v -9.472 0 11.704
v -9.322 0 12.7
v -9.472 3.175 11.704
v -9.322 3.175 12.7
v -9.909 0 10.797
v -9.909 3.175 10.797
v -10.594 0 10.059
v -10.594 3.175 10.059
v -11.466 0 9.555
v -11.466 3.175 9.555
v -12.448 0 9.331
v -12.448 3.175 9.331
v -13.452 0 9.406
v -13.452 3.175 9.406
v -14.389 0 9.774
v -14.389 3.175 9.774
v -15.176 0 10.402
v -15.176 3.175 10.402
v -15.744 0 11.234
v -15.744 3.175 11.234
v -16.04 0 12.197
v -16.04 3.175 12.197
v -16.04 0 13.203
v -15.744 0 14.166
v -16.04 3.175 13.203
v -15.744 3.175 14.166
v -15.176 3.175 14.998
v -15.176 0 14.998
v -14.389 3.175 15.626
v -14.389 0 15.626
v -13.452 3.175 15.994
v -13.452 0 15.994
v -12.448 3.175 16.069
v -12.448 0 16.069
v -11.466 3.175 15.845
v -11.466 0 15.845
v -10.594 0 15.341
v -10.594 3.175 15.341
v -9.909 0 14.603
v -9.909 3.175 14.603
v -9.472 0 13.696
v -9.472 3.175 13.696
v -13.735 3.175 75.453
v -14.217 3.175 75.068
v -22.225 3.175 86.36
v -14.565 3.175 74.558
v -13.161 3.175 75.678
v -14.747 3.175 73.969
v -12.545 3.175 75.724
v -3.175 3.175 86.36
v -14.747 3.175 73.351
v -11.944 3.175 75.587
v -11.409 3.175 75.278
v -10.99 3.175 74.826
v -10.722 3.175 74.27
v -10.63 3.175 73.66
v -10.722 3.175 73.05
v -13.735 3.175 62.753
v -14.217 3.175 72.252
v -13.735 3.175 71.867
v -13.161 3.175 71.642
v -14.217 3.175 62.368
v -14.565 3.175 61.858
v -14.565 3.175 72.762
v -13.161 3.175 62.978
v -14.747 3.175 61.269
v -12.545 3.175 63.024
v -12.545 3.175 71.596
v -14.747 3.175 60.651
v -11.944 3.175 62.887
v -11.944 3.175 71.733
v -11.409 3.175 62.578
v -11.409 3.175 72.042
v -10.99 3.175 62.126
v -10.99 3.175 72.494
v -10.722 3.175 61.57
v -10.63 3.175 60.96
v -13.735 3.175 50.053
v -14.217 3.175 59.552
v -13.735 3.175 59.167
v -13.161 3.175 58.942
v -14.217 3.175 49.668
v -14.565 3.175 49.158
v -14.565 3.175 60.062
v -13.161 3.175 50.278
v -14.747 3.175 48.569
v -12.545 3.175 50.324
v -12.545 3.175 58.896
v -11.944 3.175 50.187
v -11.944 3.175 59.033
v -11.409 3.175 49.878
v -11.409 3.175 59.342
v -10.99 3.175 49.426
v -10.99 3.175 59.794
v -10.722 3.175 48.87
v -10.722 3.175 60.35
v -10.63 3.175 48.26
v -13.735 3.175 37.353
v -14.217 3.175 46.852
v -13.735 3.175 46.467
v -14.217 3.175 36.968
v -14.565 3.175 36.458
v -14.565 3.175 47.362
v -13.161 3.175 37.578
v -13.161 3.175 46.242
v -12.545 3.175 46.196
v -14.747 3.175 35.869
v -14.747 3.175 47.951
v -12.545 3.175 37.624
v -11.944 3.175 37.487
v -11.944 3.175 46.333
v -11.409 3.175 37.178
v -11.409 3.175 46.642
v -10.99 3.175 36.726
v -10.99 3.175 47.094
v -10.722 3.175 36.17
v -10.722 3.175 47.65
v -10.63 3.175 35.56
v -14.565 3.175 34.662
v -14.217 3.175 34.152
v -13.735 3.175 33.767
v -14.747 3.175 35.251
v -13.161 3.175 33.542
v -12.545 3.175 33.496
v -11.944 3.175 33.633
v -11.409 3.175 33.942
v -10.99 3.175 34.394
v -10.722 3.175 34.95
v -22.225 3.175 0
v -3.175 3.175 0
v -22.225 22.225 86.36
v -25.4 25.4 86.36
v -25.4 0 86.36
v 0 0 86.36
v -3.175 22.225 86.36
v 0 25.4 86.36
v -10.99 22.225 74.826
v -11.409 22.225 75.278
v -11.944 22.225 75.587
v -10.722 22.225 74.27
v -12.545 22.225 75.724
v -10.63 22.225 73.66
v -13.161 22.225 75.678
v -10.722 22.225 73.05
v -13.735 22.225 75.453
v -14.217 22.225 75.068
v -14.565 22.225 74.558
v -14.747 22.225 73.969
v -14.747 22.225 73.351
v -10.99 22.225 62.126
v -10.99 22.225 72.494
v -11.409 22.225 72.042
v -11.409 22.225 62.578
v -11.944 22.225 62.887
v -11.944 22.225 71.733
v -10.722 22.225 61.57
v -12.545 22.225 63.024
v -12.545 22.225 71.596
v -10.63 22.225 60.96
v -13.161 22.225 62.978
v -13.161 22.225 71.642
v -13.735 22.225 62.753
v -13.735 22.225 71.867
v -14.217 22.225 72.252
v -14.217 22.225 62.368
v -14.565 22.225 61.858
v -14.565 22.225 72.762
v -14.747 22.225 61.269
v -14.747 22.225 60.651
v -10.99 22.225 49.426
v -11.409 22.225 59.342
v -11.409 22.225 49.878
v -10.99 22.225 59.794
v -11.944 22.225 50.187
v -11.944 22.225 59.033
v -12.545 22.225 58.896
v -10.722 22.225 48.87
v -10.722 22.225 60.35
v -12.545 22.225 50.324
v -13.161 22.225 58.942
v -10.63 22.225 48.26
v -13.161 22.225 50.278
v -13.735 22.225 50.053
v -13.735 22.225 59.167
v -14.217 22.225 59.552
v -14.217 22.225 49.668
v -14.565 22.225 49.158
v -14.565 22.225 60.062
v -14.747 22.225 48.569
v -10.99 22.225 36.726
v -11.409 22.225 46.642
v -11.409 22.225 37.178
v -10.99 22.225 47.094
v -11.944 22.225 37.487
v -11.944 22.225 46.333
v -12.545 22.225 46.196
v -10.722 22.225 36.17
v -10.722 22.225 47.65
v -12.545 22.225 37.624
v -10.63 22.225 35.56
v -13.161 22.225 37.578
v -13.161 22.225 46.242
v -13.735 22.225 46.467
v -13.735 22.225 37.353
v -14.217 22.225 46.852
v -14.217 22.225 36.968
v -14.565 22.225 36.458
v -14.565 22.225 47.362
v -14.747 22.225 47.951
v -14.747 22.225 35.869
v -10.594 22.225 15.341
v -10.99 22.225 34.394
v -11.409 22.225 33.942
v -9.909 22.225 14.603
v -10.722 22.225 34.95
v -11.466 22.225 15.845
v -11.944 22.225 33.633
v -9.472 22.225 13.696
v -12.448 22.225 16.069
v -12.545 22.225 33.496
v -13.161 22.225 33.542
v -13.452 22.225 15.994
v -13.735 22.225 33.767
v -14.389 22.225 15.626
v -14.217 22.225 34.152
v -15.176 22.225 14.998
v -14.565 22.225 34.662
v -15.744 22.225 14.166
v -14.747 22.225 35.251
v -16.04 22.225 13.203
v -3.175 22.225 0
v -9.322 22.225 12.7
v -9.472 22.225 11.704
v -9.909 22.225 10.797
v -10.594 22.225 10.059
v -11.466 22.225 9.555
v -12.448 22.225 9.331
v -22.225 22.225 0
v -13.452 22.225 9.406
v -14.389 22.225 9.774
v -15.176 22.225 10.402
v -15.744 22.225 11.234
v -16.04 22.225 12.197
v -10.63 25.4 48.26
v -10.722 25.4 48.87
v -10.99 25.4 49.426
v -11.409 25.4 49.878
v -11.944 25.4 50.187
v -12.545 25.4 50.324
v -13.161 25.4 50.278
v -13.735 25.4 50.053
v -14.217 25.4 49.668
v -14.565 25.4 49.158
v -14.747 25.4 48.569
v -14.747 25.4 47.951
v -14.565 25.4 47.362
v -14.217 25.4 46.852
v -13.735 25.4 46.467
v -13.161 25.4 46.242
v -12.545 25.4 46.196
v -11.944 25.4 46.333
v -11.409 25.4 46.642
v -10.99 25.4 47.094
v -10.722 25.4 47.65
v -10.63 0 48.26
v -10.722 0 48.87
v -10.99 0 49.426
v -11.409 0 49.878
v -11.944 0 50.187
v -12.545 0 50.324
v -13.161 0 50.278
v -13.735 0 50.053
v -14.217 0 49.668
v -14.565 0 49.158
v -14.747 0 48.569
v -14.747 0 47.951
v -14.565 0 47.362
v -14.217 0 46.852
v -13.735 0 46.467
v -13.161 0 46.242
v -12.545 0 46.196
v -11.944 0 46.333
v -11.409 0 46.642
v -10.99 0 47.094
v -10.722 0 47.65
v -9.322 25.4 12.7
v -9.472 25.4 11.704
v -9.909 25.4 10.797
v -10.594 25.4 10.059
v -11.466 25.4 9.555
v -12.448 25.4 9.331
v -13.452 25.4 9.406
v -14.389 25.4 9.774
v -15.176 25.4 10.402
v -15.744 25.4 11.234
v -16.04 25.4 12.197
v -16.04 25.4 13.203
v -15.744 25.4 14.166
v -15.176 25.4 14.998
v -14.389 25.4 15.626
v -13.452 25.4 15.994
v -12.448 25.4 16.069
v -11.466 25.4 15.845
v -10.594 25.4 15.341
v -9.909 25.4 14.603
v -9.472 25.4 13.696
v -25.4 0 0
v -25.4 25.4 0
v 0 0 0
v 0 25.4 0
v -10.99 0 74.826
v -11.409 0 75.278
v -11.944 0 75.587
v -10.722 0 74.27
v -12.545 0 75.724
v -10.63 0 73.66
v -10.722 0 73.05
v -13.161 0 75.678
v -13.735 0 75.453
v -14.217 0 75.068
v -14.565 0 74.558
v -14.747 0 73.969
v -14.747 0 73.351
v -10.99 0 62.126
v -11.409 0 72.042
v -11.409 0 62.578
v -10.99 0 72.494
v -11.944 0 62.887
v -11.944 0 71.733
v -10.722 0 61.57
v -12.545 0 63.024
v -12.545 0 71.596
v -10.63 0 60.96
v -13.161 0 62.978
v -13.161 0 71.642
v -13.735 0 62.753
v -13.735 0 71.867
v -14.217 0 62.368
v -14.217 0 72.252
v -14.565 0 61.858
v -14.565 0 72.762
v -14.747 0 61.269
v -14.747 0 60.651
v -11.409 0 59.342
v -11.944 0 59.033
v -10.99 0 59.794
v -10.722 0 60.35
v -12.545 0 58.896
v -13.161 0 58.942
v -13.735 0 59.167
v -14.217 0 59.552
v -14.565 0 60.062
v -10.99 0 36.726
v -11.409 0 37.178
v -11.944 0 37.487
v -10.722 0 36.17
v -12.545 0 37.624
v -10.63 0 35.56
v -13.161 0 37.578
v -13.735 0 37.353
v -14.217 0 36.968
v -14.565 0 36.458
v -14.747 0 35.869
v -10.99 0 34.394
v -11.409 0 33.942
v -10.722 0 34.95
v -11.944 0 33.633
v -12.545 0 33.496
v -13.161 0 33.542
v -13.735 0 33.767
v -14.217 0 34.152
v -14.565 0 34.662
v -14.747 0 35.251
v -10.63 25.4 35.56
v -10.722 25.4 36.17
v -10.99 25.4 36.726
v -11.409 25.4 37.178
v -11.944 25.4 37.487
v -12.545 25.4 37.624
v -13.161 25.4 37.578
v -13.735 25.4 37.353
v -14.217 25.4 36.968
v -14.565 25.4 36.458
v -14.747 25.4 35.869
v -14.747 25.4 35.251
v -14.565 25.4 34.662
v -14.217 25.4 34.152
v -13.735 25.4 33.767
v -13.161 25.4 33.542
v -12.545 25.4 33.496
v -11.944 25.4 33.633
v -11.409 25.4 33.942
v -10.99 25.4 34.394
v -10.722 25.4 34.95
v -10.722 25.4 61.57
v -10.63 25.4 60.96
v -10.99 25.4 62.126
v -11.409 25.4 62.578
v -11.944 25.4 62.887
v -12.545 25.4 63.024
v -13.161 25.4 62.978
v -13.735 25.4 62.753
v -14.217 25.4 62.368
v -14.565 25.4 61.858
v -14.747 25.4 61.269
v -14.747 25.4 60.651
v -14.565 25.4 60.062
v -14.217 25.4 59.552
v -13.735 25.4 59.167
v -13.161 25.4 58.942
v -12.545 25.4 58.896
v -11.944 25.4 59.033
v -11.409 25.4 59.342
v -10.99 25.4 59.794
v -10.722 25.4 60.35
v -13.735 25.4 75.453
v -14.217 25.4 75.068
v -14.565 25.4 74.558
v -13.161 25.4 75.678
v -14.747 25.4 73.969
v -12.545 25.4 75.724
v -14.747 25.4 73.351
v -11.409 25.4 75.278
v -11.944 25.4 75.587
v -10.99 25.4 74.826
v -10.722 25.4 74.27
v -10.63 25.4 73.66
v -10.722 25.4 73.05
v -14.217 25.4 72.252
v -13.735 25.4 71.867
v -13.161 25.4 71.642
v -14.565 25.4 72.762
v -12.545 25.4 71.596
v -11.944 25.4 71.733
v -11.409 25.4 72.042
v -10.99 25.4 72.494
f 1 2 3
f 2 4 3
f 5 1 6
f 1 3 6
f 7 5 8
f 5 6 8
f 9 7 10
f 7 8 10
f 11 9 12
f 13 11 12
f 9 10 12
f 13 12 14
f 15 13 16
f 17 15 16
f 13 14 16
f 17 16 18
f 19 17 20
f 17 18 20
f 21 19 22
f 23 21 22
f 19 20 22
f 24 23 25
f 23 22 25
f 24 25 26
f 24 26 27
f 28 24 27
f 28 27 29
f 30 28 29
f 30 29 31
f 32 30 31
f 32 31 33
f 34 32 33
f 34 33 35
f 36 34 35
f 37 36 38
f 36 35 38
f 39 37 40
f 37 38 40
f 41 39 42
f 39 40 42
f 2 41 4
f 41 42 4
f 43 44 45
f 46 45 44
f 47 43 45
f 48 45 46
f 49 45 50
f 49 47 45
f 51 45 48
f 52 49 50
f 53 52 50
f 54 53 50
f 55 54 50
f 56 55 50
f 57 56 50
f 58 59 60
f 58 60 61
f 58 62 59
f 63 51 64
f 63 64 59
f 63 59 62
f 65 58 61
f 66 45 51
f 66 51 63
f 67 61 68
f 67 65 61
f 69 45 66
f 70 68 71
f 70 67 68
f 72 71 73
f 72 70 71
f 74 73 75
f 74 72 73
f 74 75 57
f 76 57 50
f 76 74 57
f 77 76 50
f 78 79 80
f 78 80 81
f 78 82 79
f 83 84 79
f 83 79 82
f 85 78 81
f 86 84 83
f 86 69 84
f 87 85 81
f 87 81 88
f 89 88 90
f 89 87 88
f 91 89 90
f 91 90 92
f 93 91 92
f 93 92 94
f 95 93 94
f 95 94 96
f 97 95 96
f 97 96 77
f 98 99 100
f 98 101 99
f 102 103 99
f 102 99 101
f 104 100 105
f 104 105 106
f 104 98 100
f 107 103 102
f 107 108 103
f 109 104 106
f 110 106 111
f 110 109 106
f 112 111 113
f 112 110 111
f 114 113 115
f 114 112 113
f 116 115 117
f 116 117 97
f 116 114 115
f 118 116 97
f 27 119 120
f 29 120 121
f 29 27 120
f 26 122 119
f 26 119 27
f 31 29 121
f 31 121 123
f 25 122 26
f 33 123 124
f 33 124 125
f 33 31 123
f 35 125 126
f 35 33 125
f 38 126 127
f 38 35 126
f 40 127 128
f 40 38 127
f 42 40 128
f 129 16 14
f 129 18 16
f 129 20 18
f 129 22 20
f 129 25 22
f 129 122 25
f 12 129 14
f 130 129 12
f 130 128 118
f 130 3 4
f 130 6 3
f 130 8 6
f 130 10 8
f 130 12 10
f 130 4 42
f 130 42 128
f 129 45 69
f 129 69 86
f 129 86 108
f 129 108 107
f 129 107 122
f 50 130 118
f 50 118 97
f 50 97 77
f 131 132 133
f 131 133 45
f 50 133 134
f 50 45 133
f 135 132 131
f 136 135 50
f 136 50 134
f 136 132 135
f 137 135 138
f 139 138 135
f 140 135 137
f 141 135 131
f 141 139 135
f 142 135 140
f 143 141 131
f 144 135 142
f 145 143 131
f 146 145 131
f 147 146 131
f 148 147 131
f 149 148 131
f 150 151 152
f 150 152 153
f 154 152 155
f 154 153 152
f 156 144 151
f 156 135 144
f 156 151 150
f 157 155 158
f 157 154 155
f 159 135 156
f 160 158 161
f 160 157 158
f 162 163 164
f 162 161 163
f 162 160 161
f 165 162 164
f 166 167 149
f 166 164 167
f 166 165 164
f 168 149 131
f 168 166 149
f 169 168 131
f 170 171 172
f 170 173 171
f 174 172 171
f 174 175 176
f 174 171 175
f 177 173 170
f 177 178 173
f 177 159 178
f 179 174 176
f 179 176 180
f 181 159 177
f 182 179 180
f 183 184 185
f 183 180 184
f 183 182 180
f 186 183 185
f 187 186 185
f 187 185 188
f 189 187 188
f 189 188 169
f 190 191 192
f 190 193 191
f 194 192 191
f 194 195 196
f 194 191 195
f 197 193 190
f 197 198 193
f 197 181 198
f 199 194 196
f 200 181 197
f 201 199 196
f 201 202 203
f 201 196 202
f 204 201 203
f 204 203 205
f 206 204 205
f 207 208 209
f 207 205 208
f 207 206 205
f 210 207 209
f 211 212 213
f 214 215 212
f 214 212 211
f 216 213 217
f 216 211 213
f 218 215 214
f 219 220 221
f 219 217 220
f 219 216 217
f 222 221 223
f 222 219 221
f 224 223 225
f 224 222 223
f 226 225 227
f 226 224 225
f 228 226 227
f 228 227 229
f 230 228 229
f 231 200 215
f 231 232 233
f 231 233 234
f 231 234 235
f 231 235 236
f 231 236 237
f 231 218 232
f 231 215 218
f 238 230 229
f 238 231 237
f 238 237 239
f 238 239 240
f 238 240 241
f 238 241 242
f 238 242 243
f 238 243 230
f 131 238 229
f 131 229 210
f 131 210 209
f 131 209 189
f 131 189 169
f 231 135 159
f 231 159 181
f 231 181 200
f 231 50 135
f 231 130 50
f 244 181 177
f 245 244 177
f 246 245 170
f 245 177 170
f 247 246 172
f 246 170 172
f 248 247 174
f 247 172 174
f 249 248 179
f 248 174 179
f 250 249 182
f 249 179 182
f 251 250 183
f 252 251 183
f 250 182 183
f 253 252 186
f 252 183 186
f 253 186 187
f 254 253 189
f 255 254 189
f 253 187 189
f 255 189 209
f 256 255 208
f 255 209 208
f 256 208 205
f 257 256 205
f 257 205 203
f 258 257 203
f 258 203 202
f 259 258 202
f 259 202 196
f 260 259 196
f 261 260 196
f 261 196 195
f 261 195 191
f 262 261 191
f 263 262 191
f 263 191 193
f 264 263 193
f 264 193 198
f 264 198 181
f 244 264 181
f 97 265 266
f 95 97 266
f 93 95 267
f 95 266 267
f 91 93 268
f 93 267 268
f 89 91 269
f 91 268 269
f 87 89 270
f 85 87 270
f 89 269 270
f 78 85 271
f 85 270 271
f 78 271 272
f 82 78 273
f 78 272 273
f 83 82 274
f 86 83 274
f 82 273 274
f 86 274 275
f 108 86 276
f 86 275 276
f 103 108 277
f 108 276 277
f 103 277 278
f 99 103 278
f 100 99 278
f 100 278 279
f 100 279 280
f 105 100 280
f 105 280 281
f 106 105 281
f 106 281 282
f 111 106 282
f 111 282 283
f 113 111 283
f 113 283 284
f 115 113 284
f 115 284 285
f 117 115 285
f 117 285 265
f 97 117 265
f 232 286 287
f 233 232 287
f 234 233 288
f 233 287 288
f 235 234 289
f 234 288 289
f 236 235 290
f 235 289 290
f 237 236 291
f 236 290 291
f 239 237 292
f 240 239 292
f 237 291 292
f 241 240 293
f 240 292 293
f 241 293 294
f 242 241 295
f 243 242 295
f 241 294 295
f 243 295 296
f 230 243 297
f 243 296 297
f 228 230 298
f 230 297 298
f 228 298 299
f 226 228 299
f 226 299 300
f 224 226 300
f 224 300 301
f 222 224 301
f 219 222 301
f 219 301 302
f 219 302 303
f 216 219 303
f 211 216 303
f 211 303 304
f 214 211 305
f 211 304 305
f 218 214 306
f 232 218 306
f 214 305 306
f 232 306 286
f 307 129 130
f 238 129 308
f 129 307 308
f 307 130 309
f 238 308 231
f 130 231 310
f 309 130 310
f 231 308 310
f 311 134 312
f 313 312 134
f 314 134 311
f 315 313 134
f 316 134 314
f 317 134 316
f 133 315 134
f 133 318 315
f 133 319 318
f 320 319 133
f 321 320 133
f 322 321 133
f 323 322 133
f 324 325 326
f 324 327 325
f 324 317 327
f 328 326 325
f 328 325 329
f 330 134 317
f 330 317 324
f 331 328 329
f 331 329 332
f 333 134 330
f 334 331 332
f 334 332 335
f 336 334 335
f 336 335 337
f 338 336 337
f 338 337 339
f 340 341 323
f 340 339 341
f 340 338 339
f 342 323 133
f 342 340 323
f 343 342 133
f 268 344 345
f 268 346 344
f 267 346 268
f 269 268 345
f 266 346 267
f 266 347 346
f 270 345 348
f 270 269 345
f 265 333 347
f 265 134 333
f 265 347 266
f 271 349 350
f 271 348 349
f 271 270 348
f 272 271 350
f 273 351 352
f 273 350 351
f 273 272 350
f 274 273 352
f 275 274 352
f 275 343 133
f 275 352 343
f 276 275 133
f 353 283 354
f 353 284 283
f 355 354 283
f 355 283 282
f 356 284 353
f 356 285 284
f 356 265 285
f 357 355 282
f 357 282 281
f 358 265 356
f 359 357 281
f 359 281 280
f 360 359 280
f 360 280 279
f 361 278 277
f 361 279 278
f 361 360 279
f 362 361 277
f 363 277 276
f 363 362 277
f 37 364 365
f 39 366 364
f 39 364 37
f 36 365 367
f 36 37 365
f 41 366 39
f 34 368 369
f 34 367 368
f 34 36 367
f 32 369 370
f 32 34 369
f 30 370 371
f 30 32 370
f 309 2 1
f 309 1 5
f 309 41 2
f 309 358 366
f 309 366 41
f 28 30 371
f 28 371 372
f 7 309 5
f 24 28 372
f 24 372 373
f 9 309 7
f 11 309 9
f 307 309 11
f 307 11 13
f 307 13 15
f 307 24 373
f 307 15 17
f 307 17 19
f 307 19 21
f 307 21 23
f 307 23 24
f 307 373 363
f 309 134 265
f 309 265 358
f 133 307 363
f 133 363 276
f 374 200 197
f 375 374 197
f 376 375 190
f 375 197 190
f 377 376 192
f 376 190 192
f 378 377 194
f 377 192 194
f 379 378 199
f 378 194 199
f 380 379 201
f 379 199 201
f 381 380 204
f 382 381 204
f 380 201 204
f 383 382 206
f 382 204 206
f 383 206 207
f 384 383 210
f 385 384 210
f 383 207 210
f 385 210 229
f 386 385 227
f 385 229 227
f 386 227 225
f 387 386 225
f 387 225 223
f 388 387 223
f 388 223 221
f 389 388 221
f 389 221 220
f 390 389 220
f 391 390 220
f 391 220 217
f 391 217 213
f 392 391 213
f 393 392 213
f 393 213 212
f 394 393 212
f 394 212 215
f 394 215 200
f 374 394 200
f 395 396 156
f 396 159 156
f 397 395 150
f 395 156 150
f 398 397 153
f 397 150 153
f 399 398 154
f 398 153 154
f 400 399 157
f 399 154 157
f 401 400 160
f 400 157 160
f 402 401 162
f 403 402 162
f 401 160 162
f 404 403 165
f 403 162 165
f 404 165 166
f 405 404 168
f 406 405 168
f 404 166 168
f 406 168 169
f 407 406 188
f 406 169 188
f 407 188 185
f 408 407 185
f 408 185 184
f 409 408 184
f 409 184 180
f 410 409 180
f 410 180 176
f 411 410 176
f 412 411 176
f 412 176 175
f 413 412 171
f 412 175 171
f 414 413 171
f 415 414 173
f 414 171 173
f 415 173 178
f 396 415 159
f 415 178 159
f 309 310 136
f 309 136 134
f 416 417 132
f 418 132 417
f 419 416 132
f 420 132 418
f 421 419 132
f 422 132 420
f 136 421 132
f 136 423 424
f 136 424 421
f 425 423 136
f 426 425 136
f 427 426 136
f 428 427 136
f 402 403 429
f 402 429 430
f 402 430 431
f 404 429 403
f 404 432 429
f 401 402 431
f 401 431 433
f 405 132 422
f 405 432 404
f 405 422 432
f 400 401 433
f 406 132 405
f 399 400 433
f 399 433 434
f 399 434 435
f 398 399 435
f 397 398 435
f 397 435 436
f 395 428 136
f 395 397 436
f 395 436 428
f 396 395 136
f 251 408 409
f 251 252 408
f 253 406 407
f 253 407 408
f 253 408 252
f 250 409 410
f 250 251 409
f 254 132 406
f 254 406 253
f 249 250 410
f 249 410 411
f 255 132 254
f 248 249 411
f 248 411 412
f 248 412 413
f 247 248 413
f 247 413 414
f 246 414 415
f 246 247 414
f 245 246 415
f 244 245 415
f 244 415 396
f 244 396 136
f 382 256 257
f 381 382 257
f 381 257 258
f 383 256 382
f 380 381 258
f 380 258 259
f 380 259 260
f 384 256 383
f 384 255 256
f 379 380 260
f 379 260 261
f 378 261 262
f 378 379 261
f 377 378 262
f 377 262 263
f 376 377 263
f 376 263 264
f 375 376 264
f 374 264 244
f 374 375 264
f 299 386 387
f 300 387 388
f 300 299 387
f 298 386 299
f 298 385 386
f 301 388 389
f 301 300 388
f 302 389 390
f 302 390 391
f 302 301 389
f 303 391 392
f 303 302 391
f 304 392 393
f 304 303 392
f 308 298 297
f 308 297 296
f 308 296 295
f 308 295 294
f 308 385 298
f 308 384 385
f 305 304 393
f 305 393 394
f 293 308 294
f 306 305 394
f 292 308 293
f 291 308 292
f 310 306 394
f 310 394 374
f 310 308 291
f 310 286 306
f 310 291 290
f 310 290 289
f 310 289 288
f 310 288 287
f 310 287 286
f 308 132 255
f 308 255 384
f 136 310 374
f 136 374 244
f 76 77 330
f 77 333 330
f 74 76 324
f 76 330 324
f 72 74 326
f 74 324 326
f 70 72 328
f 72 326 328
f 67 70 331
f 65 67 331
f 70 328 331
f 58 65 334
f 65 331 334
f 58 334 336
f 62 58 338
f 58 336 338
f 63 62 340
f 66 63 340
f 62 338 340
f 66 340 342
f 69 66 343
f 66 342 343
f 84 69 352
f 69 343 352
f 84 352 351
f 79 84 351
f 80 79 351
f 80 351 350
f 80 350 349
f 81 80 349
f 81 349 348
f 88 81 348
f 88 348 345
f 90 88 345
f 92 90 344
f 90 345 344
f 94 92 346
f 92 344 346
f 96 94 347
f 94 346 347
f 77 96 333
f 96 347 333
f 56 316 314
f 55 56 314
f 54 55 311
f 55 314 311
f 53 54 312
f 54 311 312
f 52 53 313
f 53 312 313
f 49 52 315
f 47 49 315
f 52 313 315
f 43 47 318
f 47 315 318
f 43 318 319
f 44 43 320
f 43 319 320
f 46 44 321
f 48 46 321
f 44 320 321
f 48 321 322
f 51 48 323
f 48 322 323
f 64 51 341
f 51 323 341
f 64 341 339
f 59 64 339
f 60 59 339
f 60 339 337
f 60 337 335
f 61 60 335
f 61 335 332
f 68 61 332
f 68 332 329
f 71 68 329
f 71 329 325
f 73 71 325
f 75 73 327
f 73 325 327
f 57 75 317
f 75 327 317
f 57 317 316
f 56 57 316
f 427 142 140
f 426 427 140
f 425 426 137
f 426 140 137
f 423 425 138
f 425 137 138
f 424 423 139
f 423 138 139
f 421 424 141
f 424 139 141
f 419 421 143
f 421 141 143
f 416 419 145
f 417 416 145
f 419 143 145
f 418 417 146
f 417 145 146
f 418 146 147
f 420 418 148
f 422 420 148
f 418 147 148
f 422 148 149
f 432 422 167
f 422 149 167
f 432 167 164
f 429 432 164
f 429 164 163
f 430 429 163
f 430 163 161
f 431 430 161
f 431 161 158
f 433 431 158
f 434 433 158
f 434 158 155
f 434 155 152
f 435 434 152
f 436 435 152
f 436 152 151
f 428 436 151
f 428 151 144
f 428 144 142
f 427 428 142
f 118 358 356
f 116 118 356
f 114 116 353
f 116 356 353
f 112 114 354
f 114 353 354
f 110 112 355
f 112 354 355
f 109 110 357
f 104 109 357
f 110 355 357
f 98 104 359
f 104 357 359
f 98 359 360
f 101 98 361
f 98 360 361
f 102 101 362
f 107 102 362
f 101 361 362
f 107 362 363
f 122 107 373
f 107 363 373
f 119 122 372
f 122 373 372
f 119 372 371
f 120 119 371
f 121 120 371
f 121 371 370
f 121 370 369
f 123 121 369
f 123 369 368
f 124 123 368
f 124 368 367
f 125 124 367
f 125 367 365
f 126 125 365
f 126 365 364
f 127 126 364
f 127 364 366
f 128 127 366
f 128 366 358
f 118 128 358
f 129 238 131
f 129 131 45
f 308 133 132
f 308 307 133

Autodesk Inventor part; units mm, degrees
ref_plane "YZ Plane" through (0, 0, 0) normal (1, 0, 0) x (0, 1, 0)
ref_plane "XZ Plane" through (0, 0, 0) normal (0, 1, 0) x (-1, 0, 0)
ref_plane "XY Plane" through (0, 0, 0) normal (0, 0, 1) x (1, 0, 0)
sketch "Sketch1" plane through (0, 0, 0) normal (0, 0, 1) x (1, 0, 0)
  line L0 (0, 0) -> (-25.4, 0)
  line L1 (-25.4, 0) -> (-25.4, 25.4)
  line L2 (-25.4, 25.4) -> (0, 25.4)
  line L3 (0, 25.4) -> (0, 0)
  line L4 (-3.175, 22.225) -> (-22.225, 22.225)
  line L5 (-22.225, 22.225) -> (-22.225, 3.175)
  line L6 (-22.225, 3.175) -> (-3.175, 3.175)
  line L7 (-3.175, 3.175) -> (-3.175, 22.225)
  dimension "d0" = 25.4
  dimension "d1" = 25.4
  dimension "d2" = 3.175
extrude "Extrusion1" add sketch "Sketch1" along normal blind 86.36
sketch "Sketch2" plane through (-25.4, 25.4, 0) normal (0, 1, 0) x (1, 0, 0)
  line L0 (0, 0) -> (25.4, 0) projected
  line L1 (25.4, 0) -> (25.4, -86.36) projected
  line L2 (12.7, 0) -> (12.7, -12.7)
  circle A0 centre (12.7, -12.7) radius 3.3782
  dimension "d5" = 12.7
  dimension "d6" = 6.7564
extrude "Extrusion2" cut sketch "Sketch2" against normal blind 86.36
sketch "Sketch3" plane through (-25.4, 0, 0) normal (0, -1, 0) x (1, 0, 0)
  circle A0 centre (12.7, 73.66) radius 2.0701 projected
  circle A1 centre (12.7, 60.96) radius 2.0701 projected
  circle A2 centre (12.7, 48.26) radius 2.0701 projected
  circle A3 centre (12.7, 35.56) radius 2.0701 projected
extrude "Extrusion3" cut sketch "Sketch3" against normal blind 25.4
properties part number "side bumper mount" material "Aluminum 6061"
